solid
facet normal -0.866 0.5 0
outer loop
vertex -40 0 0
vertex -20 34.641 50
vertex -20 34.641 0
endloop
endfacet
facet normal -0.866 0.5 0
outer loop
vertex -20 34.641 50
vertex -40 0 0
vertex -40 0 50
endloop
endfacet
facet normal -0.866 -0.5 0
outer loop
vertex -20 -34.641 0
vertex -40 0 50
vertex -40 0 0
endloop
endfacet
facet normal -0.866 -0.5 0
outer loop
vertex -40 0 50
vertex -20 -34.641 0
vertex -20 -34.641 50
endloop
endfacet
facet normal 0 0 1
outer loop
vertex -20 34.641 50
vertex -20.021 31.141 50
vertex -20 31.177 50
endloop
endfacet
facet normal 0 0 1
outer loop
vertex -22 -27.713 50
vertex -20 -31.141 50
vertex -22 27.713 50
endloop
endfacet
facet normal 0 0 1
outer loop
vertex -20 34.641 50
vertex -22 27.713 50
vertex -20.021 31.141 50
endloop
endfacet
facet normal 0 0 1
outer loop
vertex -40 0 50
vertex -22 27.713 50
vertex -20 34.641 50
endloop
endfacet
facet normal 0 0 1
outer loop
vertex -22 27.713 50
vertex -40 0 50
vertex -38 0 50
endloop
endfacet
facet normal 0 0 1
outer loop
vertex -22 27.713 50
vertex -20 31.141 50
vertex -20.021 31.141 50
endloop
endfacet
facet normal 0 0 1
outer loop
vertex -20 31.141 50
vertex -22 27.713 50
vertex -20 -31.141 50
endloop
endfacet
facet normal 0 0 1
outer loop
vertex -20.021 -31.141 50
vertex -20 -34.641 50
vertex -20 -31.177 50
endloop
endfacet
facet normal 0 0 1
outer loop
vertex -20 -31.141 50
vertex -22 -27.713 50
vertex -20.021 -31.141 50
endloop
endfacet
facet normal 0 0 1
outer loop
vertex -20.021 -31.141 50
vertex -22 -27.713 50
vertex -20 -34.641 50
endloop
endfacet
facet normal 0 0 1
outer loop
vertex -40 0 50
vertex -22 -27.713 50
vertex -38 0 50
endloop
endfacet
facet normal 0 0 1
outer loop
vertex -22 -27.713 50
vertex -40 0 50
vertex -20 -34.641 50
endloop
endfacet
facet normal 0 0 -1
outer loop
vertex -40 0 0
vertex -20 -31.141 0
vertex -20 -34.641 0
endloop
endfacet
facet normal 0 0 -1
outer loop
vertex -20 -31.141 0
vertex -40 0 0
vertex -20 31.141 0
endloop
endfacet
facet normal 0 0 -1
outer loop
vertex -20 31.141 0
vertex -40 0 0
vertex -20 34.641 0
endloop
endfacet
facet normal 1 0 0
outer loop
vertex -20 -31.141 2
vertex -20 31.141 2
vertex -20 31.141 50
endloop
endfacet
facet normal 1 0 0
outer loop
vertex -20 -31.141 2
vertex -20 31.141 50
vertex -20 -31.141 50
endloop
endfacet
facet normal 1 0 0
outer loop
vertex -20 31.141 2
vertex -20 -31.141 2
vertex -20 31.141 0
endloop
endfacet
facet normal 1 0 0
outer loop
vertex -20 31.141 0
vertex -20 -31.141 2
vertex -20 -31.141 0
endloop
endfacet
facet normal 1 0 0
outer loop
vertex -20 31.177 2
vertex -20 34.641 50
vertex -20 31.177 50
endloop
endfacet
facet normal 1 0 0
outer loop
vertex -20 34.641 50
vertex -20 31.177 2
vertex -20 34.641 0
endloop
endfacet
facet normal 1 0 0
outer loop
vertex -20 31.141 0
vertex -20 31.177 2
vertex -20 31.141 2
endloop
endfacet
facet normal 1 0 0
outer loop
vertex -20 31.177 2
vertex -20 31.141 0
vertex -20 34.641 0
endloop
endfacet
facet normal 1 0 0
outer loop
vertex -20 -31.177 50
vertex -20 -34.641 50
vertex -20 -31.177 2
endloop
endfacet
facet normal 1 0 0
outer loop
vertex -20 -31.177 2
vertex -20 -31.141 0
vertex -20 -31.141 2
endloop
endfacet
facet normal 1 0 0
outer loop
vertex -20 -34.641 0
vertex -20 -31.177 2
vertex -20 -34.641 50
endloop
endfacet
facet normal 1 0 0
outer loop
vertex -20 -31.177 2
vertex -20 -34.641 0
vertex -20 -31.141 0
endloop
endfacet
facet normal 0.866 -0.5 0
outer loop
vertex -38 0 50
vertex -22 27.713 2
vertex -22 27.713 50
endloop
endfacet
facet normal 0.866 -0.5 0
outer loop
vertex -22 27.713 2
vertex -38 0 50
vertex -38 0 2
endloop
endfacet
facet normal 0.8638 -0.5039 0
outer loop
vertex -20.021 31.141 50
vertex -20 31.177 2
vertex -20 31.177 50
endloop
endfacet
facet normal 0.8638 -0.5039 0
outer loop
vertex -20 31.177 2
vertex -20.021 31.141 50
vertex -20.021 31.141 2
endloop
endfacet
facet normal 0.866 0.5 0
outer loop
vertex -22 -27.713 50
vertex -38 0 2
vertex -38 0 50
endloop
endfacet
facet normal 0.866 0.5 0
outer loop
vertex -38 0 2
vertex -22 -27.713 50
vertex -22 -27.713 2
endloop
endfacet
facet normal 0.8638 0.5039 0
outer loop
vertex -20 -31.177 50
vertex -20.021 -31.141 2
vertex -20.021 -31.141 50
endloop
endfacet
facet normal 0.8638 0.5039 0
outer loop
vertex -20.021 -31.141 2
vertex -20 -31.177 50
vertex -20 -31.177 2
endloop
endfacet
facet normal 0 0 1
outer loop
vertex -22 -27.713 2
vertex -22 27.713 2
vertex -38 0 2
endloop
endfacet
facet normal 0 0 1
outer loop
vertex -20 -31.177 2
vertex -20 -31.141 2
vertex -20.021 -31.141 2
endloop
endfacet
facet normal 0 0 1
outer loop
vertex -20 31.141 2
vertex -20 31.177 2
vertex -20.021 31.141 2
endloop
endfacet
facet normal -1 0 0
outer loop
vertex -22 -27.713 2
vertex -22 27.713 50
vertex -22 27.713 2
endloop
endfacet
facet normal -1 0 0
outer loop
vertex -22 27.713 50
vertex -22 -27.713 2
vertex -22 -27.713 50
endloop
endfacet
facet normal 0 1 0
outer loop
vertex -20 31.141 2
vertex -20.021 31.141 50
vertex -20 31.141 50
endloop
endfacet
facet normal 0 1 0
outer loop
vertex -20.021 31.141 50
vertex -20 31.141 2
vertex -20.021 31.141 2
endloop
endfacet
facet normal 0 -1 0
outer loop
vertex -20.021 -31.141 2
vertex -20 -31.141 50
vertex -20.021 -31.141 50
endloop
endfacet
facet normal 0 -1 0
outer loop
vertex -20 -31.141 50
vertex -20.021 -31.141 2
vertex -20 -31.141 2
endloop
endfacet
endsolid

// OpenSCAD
module hex_wedge(h=10, d=10) {
    difference() {
        cylinder(h=h, d=d, $fn=6);
        translate([-(d/4), -(d/2), 0]) cube([d, d, h]);
    }
}

d=80;
h=50;
padding = 2;
dpad = d - padding*2;

difference() {
    hex_wedge(h=h, d=d);
    translate([0, 0, padding]) hex_wedge(h=h, d=dpad);
}

height = (sqrt(3) / 2) * (d);

translate([- d/4 -(padding/2), 0, h/2]) cube([padding, height - padding*4 + 1, h], center=true);
